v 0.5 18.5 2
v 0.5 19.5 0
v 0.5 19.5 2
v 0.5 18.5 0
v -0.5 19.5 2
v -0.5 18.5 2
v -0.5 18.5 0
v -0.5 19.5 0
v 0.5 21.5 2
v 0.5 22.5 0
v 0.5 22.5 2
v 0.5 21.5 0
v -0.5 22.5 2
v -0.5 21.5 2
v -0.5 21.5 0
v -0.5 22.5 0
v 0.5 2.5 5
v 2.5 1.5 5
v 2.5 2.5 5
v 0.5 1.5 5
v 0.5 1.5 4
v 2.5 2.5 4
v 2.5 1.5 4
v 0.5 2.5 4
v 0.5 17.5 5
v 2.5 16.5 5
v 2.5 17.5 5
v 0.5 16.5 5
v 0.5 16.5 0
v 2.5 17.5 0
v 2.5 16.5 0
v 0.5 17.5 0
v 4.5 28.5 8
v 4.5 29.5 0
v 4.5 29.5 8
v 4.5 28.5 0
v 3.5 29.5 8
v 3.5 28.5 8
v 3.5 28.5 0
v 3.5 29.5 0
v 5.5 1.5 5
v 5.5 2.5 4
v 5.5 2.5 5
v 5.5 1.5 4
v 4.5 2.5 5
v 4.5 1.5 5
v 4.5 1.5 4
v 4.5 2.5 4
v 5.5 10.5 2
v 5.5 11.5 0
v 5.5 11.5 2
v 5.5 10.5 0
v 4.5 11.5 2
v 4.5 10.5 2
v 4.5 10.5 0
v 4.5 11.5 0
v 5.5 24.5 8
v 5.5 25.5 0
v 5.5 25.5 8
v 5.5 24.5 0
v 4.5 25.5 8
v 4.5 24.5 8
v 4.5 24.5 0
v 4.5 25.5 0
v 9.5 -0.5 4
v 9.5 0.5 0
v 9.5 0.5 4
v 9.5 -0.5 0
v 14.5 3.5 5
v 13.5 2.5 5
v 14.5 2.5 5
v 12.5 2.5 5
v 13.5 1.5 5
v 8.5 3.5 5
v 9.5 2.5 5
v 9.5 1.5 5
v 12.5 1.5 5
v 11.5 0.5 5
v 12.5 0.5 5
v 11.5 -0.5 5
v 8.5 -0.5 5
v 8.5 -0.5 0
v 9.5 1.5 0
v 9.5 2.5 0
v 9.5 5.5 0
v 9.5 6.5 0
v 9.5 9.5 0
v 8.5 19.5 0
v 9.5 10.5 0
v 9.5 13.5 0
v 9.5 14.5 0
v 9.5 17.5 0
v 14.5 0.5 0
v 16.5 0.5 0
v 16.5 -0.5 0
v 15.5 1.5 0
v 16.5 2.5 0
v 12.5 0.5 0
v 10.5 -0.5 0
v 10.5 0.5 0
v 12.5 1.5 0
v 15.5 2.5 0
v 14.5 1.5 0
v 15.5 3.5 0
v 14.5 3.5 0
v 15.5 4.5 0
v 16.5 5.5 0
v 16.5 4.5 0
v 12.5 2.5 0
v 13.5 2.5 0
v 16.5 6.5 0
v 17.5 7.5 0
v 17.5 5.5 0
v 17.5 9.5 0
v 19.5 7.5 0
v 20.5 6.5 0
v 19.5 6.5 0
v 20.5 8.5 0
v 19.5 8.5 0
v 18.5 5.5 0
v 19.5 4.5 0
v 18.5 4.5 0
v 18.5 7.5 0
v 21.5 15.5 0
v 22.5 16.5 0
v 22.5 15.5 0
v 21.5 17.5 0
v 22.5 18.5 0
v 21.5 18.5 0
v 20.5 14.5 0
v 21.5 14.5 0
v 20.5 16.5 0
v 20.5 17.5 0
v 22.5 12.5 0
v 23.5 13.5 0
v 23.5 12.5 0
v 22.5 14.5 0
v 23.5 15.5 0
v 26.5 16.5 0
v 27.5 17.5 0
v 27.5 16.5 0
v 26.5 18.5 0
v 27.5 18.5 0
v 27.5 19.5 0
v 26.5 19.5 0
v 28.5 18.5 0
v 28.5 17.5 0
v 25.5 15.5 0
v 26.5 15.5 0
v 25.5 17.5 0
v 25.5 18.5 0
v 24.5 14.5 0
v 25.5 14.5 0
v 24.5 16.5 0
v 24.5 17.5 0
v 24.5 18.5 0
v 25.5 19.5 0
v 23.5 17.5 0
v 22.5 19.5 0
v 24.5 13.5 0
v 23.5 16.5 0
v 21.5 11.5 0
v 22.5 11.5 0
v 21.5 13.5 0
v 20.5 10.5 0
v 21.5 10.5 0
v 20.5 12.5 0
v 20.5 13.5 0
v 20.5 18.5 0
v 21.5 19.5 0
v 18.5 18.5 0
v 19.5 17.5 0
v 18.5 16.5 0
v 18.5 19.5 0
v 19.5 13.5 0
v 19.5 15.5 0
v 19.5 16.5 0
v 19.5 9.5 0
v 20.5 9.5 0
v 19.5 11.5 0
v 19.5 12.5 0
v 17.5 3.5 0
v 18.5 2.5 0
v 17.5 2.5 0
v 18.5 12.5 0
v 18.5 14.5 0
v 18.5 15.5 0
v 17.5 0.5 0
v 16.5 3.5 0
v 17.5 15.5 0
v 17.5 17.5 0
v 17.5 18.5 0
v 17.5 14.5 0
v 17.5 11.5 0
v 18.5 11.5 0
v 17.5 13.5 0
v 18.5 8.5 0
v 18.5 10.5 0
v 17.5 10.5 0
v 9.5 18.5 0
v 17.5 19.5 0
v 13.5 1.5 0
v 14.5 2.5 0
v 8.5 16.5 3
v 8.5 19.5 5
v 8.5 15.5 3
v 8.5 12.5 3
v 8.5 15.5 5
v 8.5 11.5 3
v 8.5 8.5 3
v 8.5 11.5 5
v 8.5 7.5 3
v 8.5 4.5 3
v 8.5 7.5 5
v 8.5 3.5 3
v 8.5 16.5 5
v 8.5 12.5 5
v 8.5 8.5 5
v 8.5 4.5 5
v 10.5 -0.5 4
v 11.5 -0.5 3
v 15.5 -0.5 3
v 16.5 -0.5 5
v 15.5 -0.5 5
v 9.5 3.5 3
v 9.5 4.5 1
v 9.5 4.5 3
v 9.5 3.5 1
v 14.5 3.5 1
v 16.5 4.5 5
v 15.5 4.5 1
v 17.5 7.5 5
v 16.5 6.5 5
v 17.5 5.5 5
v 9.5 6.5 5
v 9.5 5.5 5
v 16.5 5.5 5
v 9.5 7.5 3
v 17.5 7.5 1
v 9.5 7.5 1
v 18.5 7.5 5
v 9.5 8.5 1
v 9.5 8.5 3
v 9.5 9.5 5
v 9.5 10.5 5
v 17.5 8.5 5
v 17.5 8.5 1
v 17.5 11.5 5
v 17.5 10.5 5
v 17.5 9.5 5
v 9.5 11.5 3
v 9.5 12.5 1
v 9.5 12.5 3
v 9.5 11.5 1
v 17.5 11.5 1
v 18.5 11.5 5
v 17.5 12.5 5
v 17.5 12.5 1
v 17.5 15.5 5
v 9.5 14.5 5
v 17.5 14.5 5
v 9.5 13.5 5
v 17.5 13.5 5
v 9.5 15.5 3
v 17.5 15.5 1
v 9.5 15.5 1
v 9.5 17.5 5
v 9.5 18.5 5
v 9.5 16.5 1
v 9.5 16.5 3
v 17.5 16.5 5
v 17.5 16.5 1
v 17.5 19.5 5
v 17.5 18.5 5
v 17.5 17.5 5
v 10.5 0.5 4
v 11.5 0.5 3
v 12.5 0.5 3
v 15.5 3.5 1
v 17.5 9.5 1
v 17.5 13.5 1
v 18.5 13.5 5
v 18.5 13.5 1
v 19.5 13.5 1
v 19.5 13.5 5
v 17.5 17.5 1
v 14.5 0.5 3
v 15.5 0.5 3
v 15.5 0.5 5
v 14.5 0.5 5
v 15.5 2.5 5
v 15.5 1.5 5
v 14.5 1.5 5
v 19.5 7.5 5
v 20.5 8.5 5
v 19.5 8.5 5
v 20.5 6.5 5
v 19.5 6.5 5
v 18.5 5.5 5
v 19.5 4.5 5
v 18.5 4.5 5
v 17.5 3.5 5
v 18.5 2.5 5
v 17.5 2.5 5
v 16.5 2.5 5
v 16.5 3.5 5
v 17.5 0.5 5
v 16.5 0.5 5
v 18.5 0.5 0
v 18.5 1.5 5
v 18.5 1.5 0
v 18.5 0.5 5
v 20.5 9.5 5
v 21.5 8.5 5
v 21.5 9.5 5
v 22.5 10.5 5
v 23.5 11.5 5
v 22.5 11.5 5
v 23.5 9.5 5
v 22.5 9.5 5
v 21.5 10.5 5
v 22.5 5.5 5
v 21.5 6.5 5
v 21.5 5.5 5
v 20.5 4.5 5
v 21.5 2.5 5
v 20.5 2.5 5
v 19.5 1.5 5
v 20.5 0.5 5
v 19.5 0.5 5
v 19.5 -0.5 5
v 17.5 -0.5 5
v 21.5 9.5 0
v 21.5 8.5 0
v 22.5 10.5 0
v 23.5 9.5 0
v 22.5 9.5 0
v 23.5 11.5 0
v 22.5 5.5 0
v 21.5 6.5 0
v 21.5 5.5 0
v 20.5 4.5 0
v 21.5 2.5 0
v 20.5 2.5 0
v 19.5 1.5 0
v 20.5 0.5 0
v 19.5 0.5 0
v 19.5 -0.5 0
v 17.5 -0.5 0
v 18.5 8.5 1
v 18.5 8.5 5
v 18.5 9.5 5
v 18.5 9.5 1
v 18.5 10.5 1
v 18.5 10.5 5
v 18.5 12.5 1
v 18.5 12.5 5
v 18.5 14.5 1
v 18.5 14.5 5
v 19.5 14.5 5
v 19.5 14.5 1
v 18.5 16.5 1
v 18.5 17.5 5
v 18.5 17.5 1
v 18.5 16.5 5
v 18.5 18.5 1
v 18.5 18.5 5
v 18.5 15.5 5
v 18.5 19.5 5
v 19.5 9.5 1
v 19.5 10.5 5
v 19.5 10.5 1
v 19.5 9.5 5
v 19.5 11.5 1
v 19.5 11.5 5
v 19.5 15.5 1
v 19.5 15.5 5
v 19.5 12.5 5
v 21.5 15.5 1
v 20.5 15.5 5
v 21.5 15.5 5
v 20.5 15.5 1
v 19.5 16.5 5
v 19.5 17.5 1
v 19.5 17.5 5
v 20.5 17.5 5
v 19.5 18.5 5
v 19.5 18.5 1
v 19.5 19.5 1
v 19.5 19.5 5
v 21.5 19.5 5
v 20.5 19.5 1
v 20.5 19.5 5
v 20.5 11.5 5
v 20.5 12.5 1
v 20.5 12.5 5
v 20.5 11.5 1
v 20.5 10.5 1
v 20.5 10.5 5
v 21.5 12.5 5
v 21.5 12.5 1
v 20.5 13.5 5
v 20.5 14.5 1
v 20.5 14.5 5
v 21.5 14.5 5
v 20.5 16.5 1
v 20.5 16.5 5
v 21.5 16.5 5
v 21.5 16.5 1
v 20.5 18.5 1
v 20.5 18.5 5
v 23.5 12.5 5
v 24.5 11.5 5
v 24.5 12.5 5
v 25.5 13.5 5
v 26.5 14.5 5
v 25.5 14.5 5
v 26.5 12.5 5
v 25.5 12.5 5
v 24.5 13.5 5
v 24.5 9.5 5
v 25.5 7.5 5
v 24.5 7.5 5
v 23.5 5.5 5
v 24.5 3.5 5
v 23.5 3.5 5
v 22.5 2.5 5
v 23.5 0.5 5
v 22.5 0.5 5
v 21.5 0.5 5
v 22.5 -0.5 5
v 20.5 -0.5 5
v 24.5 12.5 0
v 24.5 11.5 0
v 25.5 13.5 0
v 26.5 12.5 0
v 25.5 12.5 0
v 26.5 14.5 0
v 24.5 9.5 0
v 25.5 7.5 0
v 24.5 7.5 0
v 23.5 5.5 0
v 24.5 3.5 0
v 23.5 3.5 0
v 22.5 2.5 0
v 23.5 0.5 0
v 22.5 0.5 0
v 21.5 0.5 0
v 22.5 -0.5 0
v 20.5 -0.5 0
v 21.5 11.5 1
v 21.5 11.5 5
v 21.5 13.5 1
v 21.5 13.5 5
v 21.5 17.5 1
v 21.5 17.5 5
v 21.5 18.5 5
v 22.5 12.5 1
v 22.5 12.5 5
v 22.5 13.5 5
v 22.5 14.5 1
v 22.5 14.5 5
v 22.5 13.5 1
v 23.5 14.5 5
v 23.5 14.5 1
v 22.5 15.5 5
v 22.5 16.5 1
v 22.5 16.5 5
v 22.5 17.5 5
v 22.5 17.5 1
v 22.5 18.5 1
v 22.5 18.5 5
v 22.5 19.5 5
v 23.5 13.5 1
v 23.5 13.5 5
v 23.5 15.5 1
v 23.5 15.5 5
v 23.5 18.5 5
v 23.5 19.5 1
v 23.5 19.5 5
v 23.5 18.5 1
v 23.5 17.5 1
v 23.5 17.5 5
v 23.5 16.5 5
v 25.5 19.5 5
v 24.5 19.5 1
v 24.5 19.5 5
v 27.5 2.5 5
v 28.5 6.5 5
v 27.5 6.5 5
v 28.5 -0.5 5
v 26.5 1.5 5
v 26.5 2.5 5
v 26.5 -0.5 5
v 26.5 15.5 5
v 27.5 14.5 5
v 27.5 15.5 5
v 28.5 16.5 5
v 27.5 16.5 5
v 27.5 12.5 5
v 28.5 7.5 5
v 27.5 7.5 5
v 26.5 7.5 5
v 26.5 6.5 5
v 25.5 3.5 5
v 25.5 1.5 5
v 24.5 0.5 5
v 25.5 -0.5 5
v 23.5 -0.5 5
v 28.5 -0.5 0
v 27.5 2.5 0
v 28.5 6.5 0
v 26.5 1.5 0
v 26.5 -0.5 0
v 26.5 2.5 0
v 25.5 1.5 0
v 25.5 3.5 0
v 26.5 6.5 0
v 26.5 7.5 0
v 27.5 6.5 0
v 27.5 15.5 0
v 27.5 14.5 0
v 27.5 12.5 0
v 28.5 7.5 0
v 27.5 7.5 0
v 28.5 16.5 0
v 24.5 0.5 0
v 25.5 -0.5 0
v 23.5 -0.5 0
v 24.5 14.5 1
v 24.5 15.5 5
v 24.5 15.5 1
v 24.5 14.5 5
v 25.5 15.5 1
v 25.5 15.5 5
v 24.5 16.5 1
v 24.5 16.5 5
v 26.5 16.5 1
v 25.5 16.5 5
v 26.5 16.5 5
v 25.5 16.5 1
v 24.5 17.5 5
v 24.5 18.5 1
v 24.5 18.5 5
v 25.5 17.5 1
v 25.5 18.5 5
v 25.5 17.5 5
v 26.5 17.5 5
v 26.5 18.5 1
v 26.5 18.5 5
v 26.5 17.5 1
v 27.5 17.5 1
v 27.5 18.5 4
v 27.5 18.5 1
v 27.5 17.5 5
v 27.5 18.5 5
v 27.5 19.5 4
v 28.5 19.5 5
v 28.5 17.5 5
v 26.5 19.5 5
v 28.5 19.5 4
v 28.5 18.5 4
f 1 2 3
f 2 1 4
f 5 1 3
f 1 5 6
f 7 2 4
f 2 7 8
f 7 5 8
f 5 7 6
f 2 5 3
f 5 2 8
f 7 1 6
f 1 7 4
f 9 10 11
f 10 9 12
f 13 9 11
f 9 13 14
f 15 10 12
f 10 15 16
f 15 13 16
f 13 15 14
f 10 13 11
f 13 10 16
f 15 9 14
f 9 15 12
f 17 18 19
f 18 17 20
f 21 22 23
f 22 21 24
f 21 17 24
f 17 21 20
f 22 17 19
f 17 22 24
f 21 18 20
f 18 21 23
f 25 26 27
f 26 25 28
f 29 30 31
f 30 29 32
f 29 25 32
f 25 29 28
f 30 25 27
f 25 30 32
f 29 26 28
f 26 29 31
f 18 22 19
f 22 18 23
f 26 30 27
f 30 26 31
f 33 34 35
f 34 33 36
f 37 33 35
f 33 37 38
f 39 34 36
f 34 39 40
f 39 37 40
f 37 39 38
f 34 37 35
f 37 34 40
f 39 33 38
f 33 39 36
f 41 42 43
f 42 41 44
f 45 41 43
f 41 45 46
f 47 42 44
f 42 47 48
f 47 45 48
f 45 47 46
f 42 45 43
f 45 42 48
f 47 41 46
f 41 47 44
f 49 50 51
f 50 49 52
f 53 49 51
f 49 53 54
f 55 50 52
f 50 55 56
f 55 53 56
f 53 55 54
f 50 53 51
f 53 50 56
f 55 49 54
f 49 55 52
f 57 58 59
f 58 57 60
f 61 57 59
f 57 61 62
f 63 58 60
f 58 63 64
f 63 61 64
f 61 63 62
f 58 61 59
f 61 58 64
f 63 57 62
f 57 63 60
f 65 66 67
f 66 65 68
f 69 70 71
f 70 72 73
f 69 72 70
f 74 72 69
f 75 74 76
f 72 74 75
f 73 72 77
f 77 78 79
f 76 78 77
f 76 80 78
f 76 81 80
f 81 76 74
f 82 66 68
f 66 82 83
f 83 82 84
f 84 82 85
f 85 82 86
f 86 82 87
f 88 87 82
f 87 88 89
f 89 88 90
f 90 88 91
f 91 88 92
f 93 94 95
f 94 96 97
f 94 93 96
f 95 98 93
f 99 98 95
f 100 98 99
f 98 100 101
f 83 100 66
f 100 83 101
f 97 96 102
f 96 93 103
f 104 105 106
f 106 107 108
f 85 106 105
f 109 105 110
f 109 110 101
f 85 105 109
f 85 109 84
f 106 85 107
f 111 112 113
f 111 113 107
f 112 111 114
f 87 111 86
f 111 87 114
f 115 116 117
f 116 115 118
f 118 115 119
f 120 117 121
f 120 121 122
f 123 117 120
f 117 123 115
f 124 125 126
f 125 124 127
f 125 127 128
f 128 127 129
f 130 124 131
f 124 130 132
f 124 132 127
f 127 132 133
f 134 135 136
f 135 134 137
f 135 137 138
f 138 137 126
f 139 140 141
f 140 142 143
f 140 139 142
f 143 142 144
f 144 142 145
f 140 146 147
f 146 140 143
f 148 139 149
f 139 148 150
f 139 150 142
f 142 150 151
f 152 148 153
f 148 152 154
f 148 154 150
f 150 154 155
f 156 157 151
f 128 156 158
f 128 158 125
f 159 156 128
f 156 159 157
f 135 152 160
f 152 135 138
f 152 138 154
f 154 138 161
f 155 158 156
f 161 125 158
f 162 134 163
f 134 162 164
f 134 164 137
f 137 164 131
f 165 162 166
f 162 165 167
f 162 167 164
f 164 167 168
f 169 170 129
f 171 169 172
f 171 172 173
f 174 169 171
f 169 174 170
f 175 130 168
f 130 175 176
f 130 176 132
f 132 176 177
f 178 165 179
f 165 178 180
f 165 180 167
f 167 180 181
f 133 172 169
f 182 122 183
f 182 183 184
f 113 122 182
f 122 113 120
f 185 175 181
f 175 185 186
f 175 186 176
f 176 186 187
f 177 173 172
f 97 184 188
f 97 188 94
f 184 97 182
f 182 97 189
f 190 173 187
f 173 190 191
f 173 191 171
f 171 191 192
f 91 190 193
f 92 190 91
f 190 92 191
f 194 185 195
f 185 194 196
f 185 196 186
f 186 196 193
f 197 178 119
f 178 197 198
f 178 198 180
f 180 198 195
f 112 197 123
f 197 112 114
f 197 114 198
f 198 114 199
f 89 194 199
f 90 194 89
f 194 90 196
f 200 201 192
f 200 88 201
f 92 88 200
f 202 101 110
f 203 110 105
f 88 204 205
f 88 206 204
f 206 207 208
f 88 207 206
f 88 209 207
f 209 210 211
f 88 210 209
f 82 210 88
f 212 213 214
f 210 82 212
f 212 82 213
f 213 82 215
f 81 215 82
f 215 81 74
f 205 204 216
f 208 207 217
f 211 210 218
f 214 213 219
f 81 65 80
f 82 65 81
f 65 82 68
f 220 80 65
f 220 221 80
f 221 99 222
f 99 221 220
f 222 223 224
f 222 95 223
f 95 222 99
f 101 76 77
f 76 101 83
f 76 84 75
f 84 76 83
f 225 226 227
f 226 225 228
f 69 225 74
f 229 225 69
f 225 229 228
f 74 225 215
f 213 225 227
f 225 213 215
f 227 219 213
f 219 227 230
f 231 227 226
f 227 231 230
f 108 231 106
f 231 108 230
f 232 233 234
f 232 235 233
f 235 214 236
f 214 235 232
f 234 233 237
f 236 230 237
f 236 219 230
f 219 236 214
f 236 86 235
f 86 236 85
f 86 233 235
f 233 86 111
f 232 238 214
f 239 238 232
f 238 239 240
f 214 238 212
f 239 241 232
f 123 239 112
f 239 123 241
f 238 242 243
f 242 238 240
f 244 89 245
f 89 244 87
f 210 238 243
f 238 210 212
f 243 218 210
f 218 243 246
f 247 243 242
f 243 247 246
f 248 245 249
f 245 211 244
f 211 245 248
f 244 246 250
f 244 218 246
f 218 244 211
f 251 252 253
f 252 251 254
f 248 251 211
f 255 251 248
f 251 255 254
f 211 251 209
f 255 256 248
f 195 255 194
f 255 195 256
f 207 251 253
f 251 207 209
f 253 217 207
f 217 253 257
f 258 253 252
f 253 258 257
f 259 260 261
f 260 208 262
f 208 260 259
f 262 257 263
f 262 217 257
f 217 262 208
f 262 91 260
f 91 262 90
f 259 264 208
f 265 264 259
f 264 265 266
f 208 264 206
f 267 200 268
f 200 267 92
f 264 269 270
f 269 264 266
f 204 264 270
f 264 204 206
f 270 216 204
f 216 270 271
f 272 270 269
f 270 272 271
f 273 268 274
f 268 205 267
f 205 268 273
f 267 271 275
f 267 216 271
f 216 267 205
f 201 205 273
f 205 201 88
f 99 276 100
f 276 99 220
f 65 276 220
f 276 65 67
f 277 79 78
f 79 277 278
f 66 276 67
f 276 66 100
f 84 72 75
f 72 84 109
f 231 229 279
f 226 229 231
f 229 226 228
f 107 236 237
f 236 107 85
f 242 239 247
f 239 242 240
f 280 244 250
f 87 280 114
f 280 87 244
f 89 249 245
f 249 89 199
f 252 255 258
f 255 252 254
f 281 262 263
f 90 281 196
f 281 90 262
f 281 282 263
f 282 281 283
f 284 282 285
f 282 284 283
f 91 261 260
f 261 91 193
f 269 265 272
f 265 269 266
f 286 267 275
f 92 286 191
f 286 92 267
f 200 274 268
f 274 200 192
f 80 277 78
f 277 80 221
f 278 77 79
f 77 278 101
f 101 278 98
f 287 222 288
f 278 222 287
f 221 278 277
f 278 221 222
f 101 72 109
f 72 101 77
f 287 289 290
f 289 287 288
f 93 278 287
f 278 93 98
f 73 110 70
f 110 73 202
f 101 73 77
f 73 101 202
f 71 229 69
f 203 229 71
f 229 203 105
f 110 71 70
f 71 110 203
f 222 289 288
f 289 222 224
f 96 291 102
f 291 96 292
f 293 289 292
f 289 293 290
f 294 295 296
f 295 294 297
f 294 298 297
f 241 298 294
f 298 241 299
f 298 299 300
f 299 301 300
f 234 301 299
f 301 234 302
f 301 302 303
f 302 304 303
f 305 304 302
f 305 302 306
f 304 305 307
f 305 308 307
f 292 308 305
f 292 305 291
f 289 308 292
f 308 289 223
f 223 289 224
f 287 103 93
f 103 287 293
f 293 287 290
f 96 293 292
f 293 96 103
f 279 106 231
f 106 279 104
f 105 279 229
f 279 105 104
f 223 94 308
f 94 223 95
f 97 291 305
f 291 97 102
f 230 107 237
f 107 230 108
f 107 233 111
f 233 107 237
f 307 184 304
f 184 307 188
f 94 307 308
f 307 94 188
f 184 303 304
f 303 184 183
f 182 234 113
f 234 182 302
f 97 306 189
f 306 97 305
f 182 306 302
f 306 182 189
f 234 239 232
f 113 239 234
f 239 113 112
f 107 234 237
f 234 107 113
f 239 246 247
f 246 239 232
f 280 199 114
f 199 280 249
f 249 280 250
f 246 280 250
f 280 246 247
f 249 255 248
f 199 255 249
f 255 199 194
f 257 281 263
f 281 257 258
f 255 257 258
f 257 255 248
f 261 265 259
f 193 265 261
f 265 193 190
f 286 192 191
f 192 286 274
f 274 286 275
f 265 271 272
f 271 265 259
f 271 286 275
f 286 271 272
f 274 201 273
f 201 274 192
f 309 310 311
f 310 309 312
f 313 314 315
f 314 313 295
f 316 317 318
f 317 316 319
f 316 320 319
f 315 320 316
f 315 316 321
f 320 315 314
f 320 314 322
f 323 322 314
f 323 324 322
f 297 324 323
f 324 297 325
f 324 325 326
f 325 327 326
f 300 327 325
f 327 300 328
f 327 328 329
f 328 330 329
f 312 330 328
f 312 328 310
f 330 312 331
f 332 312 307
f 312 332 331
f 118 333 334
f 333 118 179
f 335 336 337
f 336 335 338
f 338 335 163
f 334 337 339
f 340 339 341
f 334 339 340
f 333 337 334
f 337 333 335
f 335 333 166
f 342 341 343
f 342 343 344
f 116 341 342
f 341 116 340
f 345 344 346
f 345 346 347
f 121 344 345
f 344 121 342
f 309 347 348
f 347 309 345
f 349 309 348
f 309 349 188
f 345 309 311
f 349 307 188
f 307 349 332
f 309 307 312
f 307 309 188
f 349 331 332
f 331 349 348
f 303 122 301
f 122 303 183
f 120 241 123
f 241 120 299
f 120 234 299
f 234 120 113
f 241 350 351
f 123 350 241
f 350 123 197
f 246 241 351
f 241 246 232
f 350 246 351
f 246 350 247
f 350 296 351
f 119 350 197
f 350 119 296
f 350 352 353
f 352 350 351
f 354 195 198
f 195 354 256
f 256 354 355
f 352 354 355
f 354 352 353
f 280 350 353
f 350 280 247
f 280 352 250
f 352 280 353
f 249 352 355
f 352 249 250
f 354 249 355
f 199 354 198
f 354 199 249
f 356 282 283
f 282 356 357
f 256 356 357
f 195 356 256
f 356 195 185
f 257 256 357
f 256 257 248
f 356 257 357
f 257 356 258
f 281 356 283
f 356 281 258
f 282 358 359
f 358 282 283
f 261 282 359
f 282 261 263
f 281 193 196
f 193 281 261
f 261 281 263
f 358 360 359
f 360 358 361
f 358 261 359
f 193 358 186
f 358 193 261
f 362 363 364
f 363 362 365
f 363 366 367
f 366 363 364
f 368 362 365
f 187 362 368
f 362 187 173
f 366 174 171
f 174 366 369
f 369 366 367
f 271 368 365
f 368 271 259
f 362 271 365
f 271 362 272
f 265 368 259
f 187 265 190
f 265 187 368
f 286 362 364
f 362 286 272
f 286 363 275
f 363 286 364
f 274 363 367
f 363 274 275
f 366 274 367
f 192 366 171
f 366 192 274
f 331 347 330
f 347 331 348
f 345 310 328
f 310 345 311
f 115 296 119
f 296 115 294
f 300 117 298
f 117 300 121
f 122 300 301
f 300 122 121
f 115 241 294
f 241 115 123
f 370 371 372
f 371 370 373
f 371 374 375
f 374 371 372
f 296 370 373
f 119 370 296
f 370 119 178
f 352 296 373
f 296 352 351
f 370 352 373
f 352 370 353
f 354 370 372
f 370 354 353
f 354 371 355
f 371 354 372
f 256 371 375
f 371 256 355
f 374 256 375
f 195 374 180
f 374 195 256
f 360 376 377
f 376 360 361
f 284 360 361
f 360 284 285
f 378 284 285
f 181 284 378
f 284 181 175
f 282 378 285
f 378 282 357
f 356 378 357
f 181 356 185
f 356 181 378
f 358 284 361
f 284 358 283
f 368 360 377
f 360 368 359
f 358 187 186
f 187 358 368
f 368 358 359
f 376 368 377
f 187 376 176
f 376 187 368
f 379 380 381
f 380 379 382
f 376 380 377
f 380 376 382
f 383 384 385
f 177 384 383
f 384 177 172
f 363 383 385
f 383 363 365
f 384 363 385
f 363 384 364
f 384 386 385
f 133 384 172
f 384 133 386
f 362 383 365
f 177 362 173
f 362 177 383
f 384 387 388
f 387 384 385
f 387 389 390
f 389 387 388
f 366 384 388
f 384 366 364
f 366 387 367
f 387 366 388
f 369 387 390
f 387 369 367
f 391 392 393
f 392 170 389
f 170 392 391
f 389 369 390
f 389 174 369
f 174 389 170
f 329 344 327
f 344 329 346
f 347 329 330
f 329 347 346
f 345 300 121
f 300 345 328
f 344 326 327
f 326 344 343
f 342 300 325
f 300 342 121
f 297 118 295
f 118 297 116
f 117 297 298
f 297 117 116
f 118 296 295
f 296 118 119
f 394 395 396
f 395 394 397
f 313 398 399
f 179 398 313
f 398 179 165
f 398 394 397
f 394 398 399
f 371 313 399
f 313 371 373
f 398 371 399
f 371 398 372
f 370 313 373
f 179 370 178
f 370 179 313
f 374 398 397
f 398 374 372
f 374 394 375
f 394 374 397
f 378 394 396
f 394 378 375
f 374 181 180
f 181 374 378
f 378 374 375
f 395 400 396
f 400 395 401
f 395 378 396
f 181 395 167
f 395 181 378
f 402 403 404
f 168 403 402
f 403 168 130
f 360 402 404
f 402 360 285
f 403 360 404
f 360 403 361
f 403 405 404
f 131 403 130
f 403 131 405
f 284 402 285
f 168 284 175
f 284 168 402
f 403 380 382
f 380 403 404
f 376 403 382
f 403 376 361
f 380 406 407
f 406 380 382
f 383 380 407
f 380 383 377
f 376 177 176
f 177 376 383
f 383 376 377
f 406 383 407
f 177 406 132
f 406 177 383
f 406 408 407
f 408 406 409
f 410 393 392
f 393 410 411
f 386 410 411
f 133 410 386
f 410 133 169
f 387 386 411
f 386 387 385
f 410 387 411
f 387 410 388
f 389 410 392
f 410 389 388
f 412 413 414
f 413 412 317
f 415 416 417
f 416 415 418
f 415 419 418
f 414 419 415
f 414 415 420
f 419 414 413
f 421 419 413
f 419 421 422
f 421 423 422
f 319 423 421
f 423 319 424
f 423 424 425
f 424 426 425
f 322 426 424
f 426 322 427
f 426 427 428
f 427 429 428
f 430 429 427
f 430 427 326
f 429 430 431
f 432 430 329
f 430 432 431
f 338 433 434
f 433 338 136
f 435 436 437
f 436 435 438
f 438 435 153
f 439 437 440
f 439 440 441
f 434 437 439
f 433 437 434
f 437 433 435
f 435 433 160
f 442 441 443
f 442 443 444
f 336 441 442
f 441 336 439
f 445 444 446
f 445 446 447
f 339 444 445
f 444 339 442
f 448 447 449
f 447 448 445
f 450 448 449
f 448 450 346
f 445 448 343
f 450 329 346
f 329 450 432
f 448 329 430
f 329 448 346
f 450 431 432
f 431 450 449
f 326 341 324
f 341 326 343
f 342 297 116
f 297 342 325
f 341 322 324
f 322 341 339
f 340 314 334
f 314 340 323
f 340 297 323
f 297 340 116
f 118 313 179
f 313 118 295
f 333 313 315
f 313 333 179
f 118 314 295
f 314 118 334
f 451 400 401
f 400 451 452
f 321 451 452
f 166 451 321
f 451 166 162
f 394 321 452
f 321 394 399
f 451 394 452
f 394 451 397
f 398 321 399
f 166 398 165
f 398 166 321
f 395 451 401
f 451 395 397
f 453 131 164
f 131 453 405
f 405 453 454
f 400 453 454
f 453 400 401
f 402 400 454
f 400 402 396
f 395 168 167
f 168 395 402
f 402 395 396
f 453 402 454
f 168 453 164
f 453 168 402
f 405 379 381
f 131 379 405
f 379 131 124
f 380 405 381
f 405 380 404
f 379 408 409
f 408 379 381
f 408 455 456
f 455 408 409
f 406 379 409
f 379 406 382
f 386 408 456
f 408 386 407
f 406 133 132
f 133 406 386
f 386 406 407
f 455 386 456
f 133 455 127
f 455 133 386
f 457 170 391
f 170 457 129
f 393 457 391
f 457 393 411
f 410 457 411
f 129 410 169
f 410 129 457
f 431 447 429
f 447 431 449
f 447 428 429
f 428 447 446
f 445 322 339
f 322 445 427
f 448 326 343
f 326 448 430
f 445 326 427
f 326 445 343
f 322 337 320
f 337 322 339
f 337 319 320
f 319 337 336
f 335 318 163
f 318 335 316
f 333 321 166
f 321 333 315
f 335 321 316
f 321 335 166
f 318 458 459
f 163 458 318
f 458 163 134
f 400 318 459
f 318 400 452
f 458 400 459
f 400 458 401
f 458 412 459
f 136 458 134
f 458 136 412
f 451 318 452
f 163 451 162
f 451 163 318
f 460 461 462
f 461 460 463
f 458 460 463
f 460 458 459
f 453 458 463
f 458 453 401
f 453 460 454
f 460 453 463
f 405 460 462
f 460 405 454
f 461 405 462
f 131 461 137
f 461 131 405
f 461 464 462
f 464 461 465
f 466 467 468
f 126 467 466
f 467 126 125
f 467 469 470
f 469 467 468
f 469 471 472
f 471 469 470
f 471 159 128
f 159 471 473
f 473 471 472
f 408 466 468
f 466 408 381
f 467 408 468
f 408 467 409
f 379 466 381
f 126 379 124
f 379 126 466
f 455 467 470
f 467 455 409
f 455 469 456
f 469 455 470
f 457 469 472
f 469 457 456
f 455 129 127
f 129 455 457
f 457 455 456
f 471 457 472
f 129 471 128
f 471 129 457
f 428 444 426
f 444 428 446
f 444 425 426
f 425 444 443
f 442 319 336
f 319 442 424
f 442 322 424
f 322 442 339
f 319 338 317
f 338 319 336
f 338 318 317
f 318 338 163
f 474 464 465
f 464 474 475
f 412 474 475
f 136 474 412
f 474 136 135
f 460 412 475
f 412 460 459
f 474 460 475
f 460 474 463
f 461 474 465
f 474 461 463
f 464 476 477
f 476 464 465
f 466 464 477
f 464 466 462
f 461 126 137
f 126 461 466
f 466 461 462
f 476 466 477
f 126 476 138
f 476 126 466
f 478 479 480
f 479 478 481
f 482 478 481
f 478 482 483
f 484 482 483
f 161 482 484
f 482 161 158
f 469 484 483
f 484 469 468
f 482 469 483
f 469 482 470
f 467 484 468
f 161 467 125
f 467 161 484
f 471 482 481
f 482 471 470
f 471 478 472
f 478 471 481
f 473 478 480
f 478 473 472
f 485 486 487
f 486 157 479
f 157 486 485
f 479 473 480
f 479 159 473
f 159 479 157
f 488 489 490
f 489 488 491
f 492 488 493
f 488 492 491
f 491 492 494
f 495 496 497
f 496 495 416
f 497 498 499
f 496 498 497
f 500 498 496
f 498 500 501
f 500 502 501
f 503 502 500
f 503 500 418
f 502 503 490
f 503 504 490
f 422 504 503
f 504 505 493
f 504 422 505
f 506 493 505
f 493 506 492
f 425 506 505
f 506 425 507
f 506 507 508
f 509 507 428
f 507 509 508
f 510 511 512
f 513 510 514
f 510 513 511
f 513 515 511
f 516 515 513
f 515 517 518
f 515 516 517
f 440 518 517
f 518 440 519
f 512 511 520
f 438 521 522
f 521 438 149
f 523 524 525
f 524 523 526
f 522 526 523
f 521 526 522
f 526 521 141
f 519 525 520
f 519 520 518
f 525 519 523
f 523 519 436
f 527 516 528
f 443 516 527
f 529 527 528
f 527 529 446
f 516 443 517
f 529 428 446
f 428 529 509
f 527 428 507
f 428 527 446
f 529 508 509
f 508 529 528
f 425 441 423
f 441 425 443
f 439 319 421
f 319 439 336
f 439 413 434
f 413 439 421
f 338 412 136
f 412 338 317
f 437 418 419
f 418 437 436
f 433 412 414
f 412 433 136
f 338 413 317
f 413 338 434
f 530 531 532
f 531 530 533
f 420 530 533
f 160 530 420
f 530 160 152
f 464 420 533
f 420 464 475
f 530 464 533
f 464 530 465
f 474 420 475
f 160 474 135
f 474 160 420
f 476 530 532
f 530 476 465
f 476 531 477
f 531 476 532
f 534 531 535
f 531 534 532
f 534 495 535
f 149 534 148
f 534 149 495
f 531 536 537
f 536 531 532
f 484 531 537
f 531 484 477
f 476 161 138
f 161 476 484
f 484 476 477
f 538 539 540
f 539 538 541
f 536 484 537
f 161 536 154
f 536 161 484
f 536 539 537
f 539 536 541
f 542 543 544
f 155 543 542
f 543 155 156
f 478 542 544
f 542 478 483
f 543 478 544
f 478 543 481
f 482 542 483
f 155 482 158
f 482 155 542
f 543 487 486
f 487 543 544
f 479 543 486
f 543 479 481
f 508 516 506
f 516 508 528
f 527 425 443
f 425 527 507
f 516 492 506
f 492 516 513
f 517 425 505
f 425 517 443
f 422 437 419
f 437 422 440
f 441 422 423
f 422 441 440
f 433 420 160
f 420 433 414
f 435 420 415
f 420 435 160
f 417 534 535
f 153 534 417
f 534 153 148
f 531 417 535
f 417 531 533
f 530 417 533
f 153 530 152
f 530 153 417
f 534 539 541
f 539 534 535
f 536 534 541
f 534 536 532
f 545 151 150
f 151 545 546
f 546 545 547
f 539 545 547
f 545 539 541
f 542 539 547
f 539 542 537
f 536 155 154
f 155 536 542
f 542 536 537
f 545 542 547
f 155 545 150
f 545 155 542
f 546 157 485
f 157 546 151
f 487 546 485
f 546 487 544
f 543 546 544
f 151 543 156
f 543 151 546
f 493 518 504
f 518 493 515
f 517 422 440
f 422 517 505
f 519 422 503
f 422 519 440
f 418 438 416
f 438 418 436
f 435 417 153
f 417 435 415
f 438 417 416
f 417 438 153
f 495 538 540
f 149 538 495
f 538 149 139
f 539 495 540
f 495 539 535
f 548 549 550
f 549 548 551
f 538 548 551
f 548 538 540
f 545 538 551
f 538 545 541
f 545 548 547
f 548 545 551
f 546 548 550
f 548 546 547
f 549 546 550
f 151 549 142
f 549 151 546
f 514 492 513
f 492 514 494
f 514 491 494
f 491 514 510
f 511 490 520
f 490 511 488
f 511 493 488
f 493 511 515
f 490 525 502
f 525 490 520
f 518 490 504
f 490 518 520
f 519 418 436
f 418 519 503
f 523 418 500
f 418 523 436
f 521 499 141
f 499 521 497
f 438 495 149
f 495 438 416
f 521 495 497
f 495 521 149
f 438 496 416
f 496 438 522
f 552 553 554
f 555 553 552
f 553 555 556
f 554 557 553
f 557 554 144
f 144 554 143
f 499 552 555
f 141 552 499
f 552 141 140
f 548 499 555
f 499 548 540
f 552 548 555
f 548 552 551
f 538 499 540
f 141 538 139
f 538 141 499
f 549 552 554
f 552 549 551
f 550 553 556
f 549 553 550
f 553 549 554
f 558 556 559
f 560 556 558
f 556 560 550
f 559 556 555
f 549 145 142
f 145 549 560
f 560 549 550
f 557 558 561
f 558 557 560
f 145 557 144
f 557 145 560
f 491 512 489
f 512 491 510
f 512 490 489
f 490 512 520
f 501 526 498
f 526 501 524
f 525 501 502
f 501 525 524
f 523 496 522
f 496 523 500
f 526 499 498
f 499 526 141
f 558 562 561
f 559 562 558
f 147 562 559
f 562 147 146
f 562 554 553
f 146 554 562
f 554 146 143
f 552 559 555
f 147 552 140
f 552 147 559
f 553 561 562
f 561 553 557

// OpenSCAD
union() {
    translate([0, 19, 1.0]) cube([1, 1, 2], center=true);
    translate([0, 22, 1.0]) cube([1, 1, 2], center=true);
    translate([1, 2, 4.5]) color([1, 0, 0]) cube([1, 1, 1], center=true);
    translate([1, 17, 2.5]) cube([1, 1, 5], center=true);
    translate([2, 2, 4.5]) color([0, 0, 1]) cube([1, 1, 1], center=true);
    translate([2, 17, 2.5]) cube([1, 1, 5], center=true);
    translate([4, 29, 4.0]) cube([1, 1, 8], center=true);
    translate([5, 2, 4.5]) color([1, 0, 0]) cube([1, 1, 1], center=true);
    translate([5, 11, 1.0]) cube([1, 1, 2], center=true);
    translate([5, 25, 4.0]) cube([1, 1, 8], center=true);
    translate([9, 0, 2.5]) cube([1, 1, 5], center=true);
    translate([9, 1, 2.5]) cube([1, 1, 5], center=true);
    translate([9, 2, 2.5]) cube([1, 1, 5], center=true);
    translate([9, 3, 2.5]) cube([1, 1, 5], center=true);
    translate([9, 4, 1.5]) cube([1, 1, 3], center=true);
    translate([9, 5, 2.5]) cube([1, 1, 5], center=true);
    translate([9, 6, 2.5]) cube([1, 1, 5], center=true);
    translate([9, 7, 2.5]) cube([1, 1, 5], center=true);
    translate([9, 8, 1.5]) cube([1, 1, 3], center=true);
    translate([9, 9, 2.5]) cube([1, 1, 5], center=true);
    translate([9, 10, 2.5]) cube([1, 1, 5], center=true);
    translate([9, 11, 2.5]) cube([1, 1, 5], center=true);
    translate([9, 12, 1.5]) cube([1, 1, 3], center=true);
    translate([9, 13, 2.5]) cube([1, 1, 5], center=true);
    translate([9, 14, 2.5]) cube([1, 1, 5], center=true);
    translate([9, 15, 2.5]) cube([1, 1, 5], center=true);
    translate([9, 16, 1.5]) cube([1, 1, 3], center=true);
    translate([9, 17, 2.5]) cube([1, 1, 5], center=true);
    translate([9, 18, 2.5]) cube([1, 1, 5], center=true);
    translate([9, 19, 2.5]) cube([1, 1, 5], center=true);
    translate([10, 0, 4.5]) color([1, 0, 0]) cube([1, 1, 1], center=true);
    translate([10, 1, 2.5]) cube([1, 1, 5], center=true);
    translate([10, 3, 2.5]) cube([1, 1, 5], center=true);
    translate([10, 4, 0.5]) cube([1, 1, 1], center=true);
    translate([10, 5, 2.5]) cube([1, 1, 5], center=true);
    translate([10, 7, 2.5]) cube([1, 1, 5], center=true);
    translate([10, 8, 0.5]) cube([1, 1, 1], center=true);
    translate([10, 9, 2.5]) cube([1, 1, 5], center=true);
    translate([10, 11, 2.5]) cube([1, 1, 5], center=true);
    translate([10, 12, 0.5]) cube([1, 1, 1], center=true);
    translate([10, 13, 2.5]) cube([1, 1, 5], center=true);
    translate([10, 15, 2.5]) cube([1, 1, 5], center=true);
    translate([10, 16, 0.5]) cube([1, 1, 1], center=true);
    translate([10, 17, 2.5]) cube([1, 1, 5], center=true);
    translate([10, 19, 2.5]) cube([1, 1, 5], center=true);
    translate([11, 0, 2.5]) cube([1, 1, 5], center=true);
    translate([11, 1, 2.5]) cube([1, 1, 5], center=true);
    translate([11, 3, 2.5]) cube([1, 1, 5], center=true);
    translate([11, 4, 0.5]) cube([1, 1, 1], center=true);
    translate([11, 5, 2.5]) cube([1, 1, 5], center=true);
    translate([11, 7, 2.5]) cube([1, 1, 5], center=true);
    translate([11, 8, 0.5]) cube([1, 1, 1], center=true);
    translate([11, 9, 2.5]) cube([1, 1, 5], center=true);
    translate([11, 11, 2.5]) cube([1, 1, 5], center=true);
    translate([11, 12, 0.5]) cube([1, 1, 1], center=true);
    translate([11, 13, 2.5]) cube([1, 1, 5], center=true);
    translate([11, 15, 2.5]) cube([1, 1, 5], center=true);
    translate([11, 16, 0.5]) cube([1, 1, 1], center=true);
    translate([11, 17, 2.5]) cube([1, 1, 5], center=true);
    translate([11, 19, 2.5]) cube([1, 1, 5], center=true);
    translate([12, 0, 1.5]) cube([1, 1, 3], center=true);
    translate([12, 1, 2.5]) cube([1, 1, 5], center=true);
    translate([12, 3, 2.5]) cube([1, 1, 5], center=true);
    translate([12, 4, 0.5]) cube([1, 1, 1], center=true);
    translate([12, 5, 2.5]) cube([1, 1, 5], center=true);
    translate([12, 7, 2.5]) cube([1, 1, 5], center=true);
    translate([12, 8, 0.5]) cube([1, 1, 1], center=true);
    translate([12, 9, 2.5]) cube([1, 1, 5], center=true);
    translate([12, 11, 2.5]) cube([1, 1, 5], center=true);
    translate([12, 12, 0.5]) cube([1, 1, 1], center=true);
    translate([12, 13, 2.5]) cube([1, 1, 5], center=true);
    translate([12, 15, 2.5]) cube([1, 1, 5], center=true);
    translate([12, 16, 0.5]) cube([1, 1, 1], center=true);
    translate([12, 17, 2.5]) cube([1, 1, 5], center=true);
    translate([12, 19, 2.5]) cube([1, 1, 5], center=true);
    translate([13, 0, 1.5]) cube([1, 1, 3], center=true);
    translate([13, 2, 2.5]) cube([1, 1, 5], center=true);
    translate([13, 3, 2.5]) cube([1, 1, 5], center=true);
    translate([13, 4, 0.5]) cube([1, 1, 1], center=true);
    translate([13, 5, 2.5]) cube([1, 1, 5], center=true);
    translate([13, 7, 2.5]) cube([1, 1, 5], center=true);
    translate([13, 8, 0.5]) cube([1, 1, 1], center=true);
    translate([13, 9, 2.5]) cube([1, 1, 5], center=true);
    translate([13, 11, 2.5]) cube([1, 1, 5], center=true);
    translate([13, 12, 0.5]) cube([1, 1, 1], center=true);
    translate([13, 13, 2.5]) cube([1, 1, 5], center=true);
    translate([13, 15, 2.5]) cube([1, 1, 5], center=true);
    translate([13, 16, 0.5]) cube([1, 1, 1], center=true);
    translate([13, 17, 2.5]) cube([1, 1, 5], center=true);
    translate([13, 19, 2.5]) cube([1, 1, 5], center=true);
    translate([14, 0, 1.5]) cube([1, 1, 3], center=true);
    translate([14, 3, 2.5]) cube([1, 1, 5], center=true);
    translate([14, 4, 0.5]) cube([1, 1, 1], center=true);
    translate([14, 5, 2.5]) cube([1, 1, 5], center=true);
    translate([14, 7, 2.5]) cube([1, 1, 5], center=true);
    translate([14, 8, 0.5]) cube([1, 1, 1], center=true);
    translate([14, 9, 2.5]) cube([1, 1, 5], center=true);
    translate([14, 11, 2.5]) cube([1, 1, 5], center=true);
    translate([14, 12, 0.5]) cube([1, 1, 1], center=true);
    translate([14, 13, 2.5]) cube([1, 1, 5], center=true);
    translate([14, 15, 2.5]) cube([1, 1, 5], center=true);
    translate([14, 16, 0.5]) cube([1, 1, 1], center=true);
    translate([14, 17, 2.5]) cube([1, 1, 5], center=true);
    translate([14, 19, 2.5]) cube([1, 1, 5], center=true);
    translate([15, 0, 1.5]) cube([1, 1, 3], center=true);
    translate([15, 1, 2.5]) cube([1, 1, 5], center=true);
    translate([15, 4, 0.5]) cube([1, 1, 1], center=true);
    translate([15, 5, 2.5]) cube([1, 1, 5], center=true);
    translate([15, 7, 2.5]) cube([1, 1, 5], center=true);
    translate([15, 8, 0.5]) cube([1, 1, 1], center=true);
    translate([15, 9, 2.5]) cube([1, 1, 5], center=true);
    translate([15, 11, 2.5]) cube([1, 1, 5], center=true);
    translate([15, 12, 0.5]) cube([1, 1, 1], center=true);
    translate([15, 13, 2.5]) cube([1, 1, 5], center=true);
    translate([15, 15, 2.5]) cube([1, 1, 5], center=true);
    translate([15, 16, 0.5]) cube([1, 1, 1], center=true);
    translate([15, 17, 2.5]) cube([1, 1, 5], center=true);
    translate([15, 19, 2.5]) cube([1, 1, 5], center=true);
    translate([16, 0, 2.5]) cube([1, 1, 5], center=true);
    translate([16, 1, 2.5]) cube([1, 1, 5], center=true);
    translate([16, 2, 2.5]) cube([1, 1, 5], center=true);
    translate([16, 5, 2.5]) cube([1, 1, 5], center=true);
    translate([16, 7, 2.5]) cube([1, 1, 5], center=true);
    translate([16, 8, 0.5]) cube([1, 1, 1], center=true);
    translate([16, 9, 2.5]) cube([1, 1, 5], center=true);
    translate([16, 11, 2.5]) cube([1, 1, 5], center=true);
    translate([16, 12, 0.5]) cube([1, 1, 1], center=true);
    translate([16, 13, 2.5]) cube([1, 1, 5], center=true);
    translate([16, 15, 2.5]) cube([1, 1, 5], center=true);
    translate([16, 16, 0.5]) cube([1, 1, 1], center=true);
    translate([16, 17, 2.5]) cube([1, 1, 5], center=true);
    translate([16, 19, 2.5]) cube([1, 1, 5], center=true);
    translate([17, 1, 2.5]) cube([1, 1, 5], center=true);
    translate([17, 2, 2.5]) cube([1, 1, 5], center=true);
    translate([17, 3, 2.5]) cube([1, 1, 5], center=true);
    translate([17, 6, 2.5]) cube([1, 1, 5], center=true);
    translate([17, 7, 2.5]) cube([1, 1, 5], center=true);
    translate([17, 8, 0.5]) cube([1, 1, 1], center=true);
    translate([17, 9, 2.5]) cube([1, 1, 5], center=true);
    translate([17, 11, 2.5]) cube([1, 1, 5], center=true);
    translate([17, 12, 0.5]) cube([1, 1, 1], center=true);
    translate([17, 13, 2.5]) cube([1, 1, 5], center=true);
    translate([17, 15, 2.5]) cube([1, 1, 5], center=true);
    translate([17, 16, 0.5]) cube([1, 1, 1], center=true);
    translate([17, 17, 2.5]) cube([1, 1, 5], center=true);
    translate([17, 19, 2.5]) cube([1, 1, 5], center=true);
    translate([18, 0, 2.5]) cube([1, 1, 5], center=true);
    translate([18, 3, 2.5]) cube([1, 1, 5], center=true);
    translate([18, 4, 2.5]) cube([1, 1, 5], center=true);
    translate([18, 5, 2.5]) cube([1, 1, 5], center=true);
    translate([18, 8, 2.5]) cube([1, 1, 5], center=true);
    translate([18, 9, 0.5]) cube([1, 1, 1], center=true);
    translate([18, 10, 2.5]) cube([1, 1, 5], center=true);
    translate([18, 12, 2.5]) cube([1, 1, 5], center=true);
    translate([18, 13, 0.5]) cube([1, 1, 1], center=true);
    translate([18, 14, 2.5]) cube([1, 1, 5], center=true);
    translate([18, 16, 2.5]) cube([1, 1, 5], center=true);
    translate([18, 17, 0.5]) cube([1, 1, 1], center=true);
    translate([18, 18, 2.5]) cube([1, 1, 5], center=true);
    translate([19, 0, 2.5]) cube([1, 1, 5], center=true);
    translate([19, 1, 2.5]) cube([1, 1, 5], center=true);
    translate([19, 5, 2.5]) cube([1, 1, 5], center=true);
    translate([19, 6, 2.5]) cube([1, 1, 5], center=true);
    translate([19, 7, 2.5]) cube([1, 1, 5], center=true);
    translate([19, 9, 2.5]) cube([1, 1, 5], center=true);
    translate([19, 10, 0.5]) cube([1, 1, 1], center=true);
    translate([19, 11, 2.5]) cube([1, 1, 5], center=true);
    translate([19, 13, 2.5]) cube([1, 1, 5], center=true);
    translate([19, 14, 0.5]) cube([1, 1, 1], center=true);
    translate([19, 15, 2.5]) cube([1, 1, 5], center=true);
    translate([19, 17, 2.5]) cube([1, 1, 5], center=true);
    translate([19, 18, 0.5]) cube([1, 1, 1], center=true);
    translate([19, 19, 2.5]) cube([1, 1, 5], center=true);
    translate([20, 1, 2.5]) cube([1, 1, 5], center=true);
    translate([20, 2, 2.5]) cube([1, 1, 5], center=true);
    translate([20, 3, 2.5]) cube([1, 1, 5], center=true);
    translate([20, 4, 2.5]) cube([1, 1, 5], center=true);
    translate([20, 7, 2.5]) cube([1, 1, 5], center=true);
    translate([20, 8, 2.5]) cube([1, 1, 5], center=true);
    translate([20, 10, 2.5]) cube([1, 1, 5], center=true);
    translate([20, 11, 0.5]) cube([1, 1, 1], center=true);
    translate([20, 12, 2.5]) cube([1, 1, 5], center=true);
    translate([20, 14, 2.5]) cube([1, 1, 5], center=true);
    translate([20, 15, 0.5]) cube([1, 1, 1], center=true);
    translate([20, 16, 2.5]) cube([1, 1, 5], center=true);
    translate([20, 18, 2.5]) cube([1, 1, 5], center=true);
    translate([20, 19, 0.5]) cube([1, 1, 1], center=true);
    translate([21, 0, 2.5]) cube([1, 1, 5], center=true);
    translate([21, 3, 2.5]) cube([1, 1, 5], center=true);
    translate([21, 4, 2.5]) cube([1, 1, 5], center=true);
    translate([21, 5, 2.5]) cube([1, 1, 5], center=true);
    translate([21, 6, 2.5]) cube([1, 1, 5], center=true);
    translate([21, 9, 2.5]) cube([1, 1, 5], center=true);
    translate([21, 11, 2.5]) cube([1, 1, 5], center=true);
    translate([21, 12, 0.5]) cube([1, 1, 1], center=true);
    translate([21, 13, 2.5]) cube([1, 1, 5], center=true);
    translate([21, 15, 2.5]) cube([1, 1, 5], center=true);
    translate([21, 16, 0.5]) cube([1, 1, 1], center=true);
    translate([21, 17, 2.5]) cube([1, 1, 5], center=true);
    translate([21, 19, 2.5]) cube([1, 1, 5], center=true);
    translate([22, 0, 2.5]) cube([1, 1, 5], center=true);
    translate([22, 1, 2.5]) cube([1, 1, 5], center=true);
    translate([22, 2, 2.5]) cube([1, 1, 5], center=true);
    translate([22, 6, 2.5]) cube([1, 1, 5], center=true);
    translate([22, 7, 2.5]) cube([1, 1, 5], center=true);
    translate([22, 8, 2.5]) cube([1, 1, 5], center=true);
    translate([22, 9, 2.5]) cube([1, 1, 5], center=true);
    translate([22, 10, 2.5]) cube([1, 1, 5], center=true);
    translate([22, 12, 2.5]) cube([1, 1, 5], center=true);
    translate([22, 13, 0.5]) cube([1, 1, 1], center=true);
    translate([22, 14, 2.5]) cube([1, 1, 5], center=true);
    translate([22, 16, 2.5]) cube([1, 1, 5], center=true);
    translate([22, 17, 0.5]) cube([1, 1, 1], center=true);
    translate([22, 18, 2.5]) cube([1, 1, 5], center=true);
    translate([23, 1, 2.5]) cube([1, 1, 5], center=true);
    translate([23, 2, 2.5]) cube([1, 1, 5], center=true);
    translate([23, 3, 2.5]) cube([1, 1, 5], center=true);
    translate([23, 4, 2.5]) cube([1, 1, 5], center=true);
    translate([23, 5, 2.5]) cube([1, 1, 5], center=true);
    translate([23, 10, 2.5]) cube([1, 1, 5], center=true);
    translate([23, 11, 2.5]) cube([1, 1, 5], center=true);
    translate([23, 13, 2.5]) cube([1, 1, 5], center=true);
    translate([23, 14, 0.5]) cube([1, 1, 1], center=true);
    translate([23, 15, 2.5]) cube([1, 1, 5], center=true);
    translate([23, 17, 2.5]) cube([1, 1, 5], center=true);
    translate([23, 18, 0.5]) cube([1, 1, 1], center=true);
    translate([23, 19, 2.5]) cube([1, 1, 5], center=true);
    translate([24, 0, 2.5]) cube([1, 1, 5], center=true);
    translate([24, 4, 2.5]) cube([1, 1, 5], center=true);
    translate([24, 5, 2.5]) cube([1, 1, 5], center=true);
    translate([24, 6, 2.5]) cube([1, 1, 5], center=true);
    translate([24, 7, 2.5]) cube([1, 1, 5], center=true);
    translate([24, 8, 2.5]) cube([1, 1, 5], center=true);
    translate([24, 9, 2.5]) cube([1, 1, 5], center=true);
    translate([24, 12, 2.5]) cube([1, 1, 5], center=true);
    translate([24, 14, 2.5]) cube([1, 1, 5], center=true);
    translate([24, 15, 0.5]) cube([1, 1, 1], center=true);
    translate([24, 16, 2.5]) cube([1, 1, 5], center=true);
    translate([24, 18, 2.5]) cube([1, 1, 5], center=true);
    translate([24, 19, 0.5]) cube([1, 1, 1], center=true);
    translate([25, 0, 2.5]) cube([1, 1, 5], center=true);
    translate([25, 1, 2.5]) cube([1, 1, 5], center=true);
    translate([25, 2, 2.5]) cube([1, 1, 5], center=true);
    translate([25, 3, 2.5]) cube([1, 1, 5], center=true);
    translate([25, 8, 2.5]) cube([1, 1, 5], center=true);
    translate([25, 9, 2.5]) cube([1, 1, 5], center=true);
    translate([25, 10, 2.5]) cube([1, 1, 5], center=true);
    translate([25, 11, 2.5]) cube([1, 1, 5], center=true);
    translate([25, 12, 2.5]) cube([1, 1, 5], center=true);
    translate([25, 13, 2.5]) cube([1, 1, 5], center=true);
    translate([25, 15, 2.5]) cube([1, 1, 5], center=true);
    translate([25, 16, 0.5]) cube([1, 1, 1], center=true);
    translate([25, 17, 2.5]) cube([1, 1, 5], center=true);
    translate([25, 19, 2.5]) cube([1, 1, 5], center=true);
    translate([26, 2, 2.5]) cube([1, 1, 5], center=true);
    translate([26, 3, 2.5]) cube([1, 1, 5], center=true);
    translate([26, 4, 2.5]) cube([1, 1, 5], center=true);
    translate([26, 5, 2.5]) cube([1, 1, 5], center=true);
    translate([26, 6, 2.5]) cube([1, 1, 5], center=true);
    translate([26, 7, 2.5]) cube([1, 1, 5], center=true);
    translate([26, 13, 2.5]) cube([1, 1, 5], center=true);
    translate([26, 14, 2.5]) cube([1, 1, 5], center=true);
    translate([26, 16, 2.5]) cube([1, 1, 5], center=true);
    translate([26, 17, 0.5]) cube([1, 1, 1], center=true);
    translate([26, 18, 2.5]) cube([1, 1, 5], center=true);
    translate([27, 0, 2.5]) cube([1, 1, 5], center=true);
    translate([27, 1, 2.5]) cube([1, 1, 5], center=true);
    translate([27, 2, 2.5]) cube([1, 1, 5], center=true);
    translate([27, 7, 2.5]) cube([1, 1, 5], center=true);
    translate([27, 8, 2.5]) cube([1, 1, 5], center=true);
    translate([27, 9, 2.5]) cube([1, 1, 5], center=true);
    translate([27, 10, 2.5]) cube([1, 1, 5], center=true);
    translate([27, 11, 2.5]) cube([1, 1, 5], center=true);
    translate([27, 12, 2.5]) cube([1, 1, 5], center=true);
    translate([27, 15, 2.5]) cube([1, 1, 5], center=true);
    translate([27, 17, 2.5]) cube([1, 1, 5], center=true);
    translate([27, 18, 0.5]) cube([1, 1, 1], center=true);
    translate([27, 19, 2.5]) cube([1, 1, 5], center=true);
    translate([28, 0, 2.5]) cube([1, 1, 5], center=true);
    translate([28, 1, 2.5]) cube([1, 1, 5], center=true);
    translate([28, 2, 2.5]) cube([1, 1, 5], center=true);
    translate([28, 3, 2.5]) cube([1, 1, 5], center=true);
    translate([28, 4, 2.5]) cube([1, 1, 5], center=true);
    translate([28, 5, 2.5]) cube([1, 1, 5], center=true);
    translate([28, 6, 2.5]) cube([1, 1, 5], center=true);
    translate([28, 8, 2.5]) cube([1, 1, 5], center=true);
    translate([28, 9, 2.5]) cube([1, 1, 5], center=true);
    translate([28, 10, 2.5]) cube([1, 1, 5], center=true);
    translate([28, 11, 2.5]) cube([1, 1, 5], center=true);
    translate([28, 12, 2.5]) cube([1, 1, 5], center=true);
    translate([28, 13, 2.5]) cube([1, 1, 5], center=true);
    translate([28, 14, 2.5]) cube([1, 1, 5], center=true);
    translate([28, 15, 2.5]) cube([1, 1, 5], center=true);
    translate([28, 16, 2.5]) cube([1, 1, 5], center=true);
    translate([28, 18, 2.5]) cube([1, 1, 5], center=true);
    translate([28, 19, 4.5]) color([0, 0, 1]) cube([1, 1, 1], center=true);
}
